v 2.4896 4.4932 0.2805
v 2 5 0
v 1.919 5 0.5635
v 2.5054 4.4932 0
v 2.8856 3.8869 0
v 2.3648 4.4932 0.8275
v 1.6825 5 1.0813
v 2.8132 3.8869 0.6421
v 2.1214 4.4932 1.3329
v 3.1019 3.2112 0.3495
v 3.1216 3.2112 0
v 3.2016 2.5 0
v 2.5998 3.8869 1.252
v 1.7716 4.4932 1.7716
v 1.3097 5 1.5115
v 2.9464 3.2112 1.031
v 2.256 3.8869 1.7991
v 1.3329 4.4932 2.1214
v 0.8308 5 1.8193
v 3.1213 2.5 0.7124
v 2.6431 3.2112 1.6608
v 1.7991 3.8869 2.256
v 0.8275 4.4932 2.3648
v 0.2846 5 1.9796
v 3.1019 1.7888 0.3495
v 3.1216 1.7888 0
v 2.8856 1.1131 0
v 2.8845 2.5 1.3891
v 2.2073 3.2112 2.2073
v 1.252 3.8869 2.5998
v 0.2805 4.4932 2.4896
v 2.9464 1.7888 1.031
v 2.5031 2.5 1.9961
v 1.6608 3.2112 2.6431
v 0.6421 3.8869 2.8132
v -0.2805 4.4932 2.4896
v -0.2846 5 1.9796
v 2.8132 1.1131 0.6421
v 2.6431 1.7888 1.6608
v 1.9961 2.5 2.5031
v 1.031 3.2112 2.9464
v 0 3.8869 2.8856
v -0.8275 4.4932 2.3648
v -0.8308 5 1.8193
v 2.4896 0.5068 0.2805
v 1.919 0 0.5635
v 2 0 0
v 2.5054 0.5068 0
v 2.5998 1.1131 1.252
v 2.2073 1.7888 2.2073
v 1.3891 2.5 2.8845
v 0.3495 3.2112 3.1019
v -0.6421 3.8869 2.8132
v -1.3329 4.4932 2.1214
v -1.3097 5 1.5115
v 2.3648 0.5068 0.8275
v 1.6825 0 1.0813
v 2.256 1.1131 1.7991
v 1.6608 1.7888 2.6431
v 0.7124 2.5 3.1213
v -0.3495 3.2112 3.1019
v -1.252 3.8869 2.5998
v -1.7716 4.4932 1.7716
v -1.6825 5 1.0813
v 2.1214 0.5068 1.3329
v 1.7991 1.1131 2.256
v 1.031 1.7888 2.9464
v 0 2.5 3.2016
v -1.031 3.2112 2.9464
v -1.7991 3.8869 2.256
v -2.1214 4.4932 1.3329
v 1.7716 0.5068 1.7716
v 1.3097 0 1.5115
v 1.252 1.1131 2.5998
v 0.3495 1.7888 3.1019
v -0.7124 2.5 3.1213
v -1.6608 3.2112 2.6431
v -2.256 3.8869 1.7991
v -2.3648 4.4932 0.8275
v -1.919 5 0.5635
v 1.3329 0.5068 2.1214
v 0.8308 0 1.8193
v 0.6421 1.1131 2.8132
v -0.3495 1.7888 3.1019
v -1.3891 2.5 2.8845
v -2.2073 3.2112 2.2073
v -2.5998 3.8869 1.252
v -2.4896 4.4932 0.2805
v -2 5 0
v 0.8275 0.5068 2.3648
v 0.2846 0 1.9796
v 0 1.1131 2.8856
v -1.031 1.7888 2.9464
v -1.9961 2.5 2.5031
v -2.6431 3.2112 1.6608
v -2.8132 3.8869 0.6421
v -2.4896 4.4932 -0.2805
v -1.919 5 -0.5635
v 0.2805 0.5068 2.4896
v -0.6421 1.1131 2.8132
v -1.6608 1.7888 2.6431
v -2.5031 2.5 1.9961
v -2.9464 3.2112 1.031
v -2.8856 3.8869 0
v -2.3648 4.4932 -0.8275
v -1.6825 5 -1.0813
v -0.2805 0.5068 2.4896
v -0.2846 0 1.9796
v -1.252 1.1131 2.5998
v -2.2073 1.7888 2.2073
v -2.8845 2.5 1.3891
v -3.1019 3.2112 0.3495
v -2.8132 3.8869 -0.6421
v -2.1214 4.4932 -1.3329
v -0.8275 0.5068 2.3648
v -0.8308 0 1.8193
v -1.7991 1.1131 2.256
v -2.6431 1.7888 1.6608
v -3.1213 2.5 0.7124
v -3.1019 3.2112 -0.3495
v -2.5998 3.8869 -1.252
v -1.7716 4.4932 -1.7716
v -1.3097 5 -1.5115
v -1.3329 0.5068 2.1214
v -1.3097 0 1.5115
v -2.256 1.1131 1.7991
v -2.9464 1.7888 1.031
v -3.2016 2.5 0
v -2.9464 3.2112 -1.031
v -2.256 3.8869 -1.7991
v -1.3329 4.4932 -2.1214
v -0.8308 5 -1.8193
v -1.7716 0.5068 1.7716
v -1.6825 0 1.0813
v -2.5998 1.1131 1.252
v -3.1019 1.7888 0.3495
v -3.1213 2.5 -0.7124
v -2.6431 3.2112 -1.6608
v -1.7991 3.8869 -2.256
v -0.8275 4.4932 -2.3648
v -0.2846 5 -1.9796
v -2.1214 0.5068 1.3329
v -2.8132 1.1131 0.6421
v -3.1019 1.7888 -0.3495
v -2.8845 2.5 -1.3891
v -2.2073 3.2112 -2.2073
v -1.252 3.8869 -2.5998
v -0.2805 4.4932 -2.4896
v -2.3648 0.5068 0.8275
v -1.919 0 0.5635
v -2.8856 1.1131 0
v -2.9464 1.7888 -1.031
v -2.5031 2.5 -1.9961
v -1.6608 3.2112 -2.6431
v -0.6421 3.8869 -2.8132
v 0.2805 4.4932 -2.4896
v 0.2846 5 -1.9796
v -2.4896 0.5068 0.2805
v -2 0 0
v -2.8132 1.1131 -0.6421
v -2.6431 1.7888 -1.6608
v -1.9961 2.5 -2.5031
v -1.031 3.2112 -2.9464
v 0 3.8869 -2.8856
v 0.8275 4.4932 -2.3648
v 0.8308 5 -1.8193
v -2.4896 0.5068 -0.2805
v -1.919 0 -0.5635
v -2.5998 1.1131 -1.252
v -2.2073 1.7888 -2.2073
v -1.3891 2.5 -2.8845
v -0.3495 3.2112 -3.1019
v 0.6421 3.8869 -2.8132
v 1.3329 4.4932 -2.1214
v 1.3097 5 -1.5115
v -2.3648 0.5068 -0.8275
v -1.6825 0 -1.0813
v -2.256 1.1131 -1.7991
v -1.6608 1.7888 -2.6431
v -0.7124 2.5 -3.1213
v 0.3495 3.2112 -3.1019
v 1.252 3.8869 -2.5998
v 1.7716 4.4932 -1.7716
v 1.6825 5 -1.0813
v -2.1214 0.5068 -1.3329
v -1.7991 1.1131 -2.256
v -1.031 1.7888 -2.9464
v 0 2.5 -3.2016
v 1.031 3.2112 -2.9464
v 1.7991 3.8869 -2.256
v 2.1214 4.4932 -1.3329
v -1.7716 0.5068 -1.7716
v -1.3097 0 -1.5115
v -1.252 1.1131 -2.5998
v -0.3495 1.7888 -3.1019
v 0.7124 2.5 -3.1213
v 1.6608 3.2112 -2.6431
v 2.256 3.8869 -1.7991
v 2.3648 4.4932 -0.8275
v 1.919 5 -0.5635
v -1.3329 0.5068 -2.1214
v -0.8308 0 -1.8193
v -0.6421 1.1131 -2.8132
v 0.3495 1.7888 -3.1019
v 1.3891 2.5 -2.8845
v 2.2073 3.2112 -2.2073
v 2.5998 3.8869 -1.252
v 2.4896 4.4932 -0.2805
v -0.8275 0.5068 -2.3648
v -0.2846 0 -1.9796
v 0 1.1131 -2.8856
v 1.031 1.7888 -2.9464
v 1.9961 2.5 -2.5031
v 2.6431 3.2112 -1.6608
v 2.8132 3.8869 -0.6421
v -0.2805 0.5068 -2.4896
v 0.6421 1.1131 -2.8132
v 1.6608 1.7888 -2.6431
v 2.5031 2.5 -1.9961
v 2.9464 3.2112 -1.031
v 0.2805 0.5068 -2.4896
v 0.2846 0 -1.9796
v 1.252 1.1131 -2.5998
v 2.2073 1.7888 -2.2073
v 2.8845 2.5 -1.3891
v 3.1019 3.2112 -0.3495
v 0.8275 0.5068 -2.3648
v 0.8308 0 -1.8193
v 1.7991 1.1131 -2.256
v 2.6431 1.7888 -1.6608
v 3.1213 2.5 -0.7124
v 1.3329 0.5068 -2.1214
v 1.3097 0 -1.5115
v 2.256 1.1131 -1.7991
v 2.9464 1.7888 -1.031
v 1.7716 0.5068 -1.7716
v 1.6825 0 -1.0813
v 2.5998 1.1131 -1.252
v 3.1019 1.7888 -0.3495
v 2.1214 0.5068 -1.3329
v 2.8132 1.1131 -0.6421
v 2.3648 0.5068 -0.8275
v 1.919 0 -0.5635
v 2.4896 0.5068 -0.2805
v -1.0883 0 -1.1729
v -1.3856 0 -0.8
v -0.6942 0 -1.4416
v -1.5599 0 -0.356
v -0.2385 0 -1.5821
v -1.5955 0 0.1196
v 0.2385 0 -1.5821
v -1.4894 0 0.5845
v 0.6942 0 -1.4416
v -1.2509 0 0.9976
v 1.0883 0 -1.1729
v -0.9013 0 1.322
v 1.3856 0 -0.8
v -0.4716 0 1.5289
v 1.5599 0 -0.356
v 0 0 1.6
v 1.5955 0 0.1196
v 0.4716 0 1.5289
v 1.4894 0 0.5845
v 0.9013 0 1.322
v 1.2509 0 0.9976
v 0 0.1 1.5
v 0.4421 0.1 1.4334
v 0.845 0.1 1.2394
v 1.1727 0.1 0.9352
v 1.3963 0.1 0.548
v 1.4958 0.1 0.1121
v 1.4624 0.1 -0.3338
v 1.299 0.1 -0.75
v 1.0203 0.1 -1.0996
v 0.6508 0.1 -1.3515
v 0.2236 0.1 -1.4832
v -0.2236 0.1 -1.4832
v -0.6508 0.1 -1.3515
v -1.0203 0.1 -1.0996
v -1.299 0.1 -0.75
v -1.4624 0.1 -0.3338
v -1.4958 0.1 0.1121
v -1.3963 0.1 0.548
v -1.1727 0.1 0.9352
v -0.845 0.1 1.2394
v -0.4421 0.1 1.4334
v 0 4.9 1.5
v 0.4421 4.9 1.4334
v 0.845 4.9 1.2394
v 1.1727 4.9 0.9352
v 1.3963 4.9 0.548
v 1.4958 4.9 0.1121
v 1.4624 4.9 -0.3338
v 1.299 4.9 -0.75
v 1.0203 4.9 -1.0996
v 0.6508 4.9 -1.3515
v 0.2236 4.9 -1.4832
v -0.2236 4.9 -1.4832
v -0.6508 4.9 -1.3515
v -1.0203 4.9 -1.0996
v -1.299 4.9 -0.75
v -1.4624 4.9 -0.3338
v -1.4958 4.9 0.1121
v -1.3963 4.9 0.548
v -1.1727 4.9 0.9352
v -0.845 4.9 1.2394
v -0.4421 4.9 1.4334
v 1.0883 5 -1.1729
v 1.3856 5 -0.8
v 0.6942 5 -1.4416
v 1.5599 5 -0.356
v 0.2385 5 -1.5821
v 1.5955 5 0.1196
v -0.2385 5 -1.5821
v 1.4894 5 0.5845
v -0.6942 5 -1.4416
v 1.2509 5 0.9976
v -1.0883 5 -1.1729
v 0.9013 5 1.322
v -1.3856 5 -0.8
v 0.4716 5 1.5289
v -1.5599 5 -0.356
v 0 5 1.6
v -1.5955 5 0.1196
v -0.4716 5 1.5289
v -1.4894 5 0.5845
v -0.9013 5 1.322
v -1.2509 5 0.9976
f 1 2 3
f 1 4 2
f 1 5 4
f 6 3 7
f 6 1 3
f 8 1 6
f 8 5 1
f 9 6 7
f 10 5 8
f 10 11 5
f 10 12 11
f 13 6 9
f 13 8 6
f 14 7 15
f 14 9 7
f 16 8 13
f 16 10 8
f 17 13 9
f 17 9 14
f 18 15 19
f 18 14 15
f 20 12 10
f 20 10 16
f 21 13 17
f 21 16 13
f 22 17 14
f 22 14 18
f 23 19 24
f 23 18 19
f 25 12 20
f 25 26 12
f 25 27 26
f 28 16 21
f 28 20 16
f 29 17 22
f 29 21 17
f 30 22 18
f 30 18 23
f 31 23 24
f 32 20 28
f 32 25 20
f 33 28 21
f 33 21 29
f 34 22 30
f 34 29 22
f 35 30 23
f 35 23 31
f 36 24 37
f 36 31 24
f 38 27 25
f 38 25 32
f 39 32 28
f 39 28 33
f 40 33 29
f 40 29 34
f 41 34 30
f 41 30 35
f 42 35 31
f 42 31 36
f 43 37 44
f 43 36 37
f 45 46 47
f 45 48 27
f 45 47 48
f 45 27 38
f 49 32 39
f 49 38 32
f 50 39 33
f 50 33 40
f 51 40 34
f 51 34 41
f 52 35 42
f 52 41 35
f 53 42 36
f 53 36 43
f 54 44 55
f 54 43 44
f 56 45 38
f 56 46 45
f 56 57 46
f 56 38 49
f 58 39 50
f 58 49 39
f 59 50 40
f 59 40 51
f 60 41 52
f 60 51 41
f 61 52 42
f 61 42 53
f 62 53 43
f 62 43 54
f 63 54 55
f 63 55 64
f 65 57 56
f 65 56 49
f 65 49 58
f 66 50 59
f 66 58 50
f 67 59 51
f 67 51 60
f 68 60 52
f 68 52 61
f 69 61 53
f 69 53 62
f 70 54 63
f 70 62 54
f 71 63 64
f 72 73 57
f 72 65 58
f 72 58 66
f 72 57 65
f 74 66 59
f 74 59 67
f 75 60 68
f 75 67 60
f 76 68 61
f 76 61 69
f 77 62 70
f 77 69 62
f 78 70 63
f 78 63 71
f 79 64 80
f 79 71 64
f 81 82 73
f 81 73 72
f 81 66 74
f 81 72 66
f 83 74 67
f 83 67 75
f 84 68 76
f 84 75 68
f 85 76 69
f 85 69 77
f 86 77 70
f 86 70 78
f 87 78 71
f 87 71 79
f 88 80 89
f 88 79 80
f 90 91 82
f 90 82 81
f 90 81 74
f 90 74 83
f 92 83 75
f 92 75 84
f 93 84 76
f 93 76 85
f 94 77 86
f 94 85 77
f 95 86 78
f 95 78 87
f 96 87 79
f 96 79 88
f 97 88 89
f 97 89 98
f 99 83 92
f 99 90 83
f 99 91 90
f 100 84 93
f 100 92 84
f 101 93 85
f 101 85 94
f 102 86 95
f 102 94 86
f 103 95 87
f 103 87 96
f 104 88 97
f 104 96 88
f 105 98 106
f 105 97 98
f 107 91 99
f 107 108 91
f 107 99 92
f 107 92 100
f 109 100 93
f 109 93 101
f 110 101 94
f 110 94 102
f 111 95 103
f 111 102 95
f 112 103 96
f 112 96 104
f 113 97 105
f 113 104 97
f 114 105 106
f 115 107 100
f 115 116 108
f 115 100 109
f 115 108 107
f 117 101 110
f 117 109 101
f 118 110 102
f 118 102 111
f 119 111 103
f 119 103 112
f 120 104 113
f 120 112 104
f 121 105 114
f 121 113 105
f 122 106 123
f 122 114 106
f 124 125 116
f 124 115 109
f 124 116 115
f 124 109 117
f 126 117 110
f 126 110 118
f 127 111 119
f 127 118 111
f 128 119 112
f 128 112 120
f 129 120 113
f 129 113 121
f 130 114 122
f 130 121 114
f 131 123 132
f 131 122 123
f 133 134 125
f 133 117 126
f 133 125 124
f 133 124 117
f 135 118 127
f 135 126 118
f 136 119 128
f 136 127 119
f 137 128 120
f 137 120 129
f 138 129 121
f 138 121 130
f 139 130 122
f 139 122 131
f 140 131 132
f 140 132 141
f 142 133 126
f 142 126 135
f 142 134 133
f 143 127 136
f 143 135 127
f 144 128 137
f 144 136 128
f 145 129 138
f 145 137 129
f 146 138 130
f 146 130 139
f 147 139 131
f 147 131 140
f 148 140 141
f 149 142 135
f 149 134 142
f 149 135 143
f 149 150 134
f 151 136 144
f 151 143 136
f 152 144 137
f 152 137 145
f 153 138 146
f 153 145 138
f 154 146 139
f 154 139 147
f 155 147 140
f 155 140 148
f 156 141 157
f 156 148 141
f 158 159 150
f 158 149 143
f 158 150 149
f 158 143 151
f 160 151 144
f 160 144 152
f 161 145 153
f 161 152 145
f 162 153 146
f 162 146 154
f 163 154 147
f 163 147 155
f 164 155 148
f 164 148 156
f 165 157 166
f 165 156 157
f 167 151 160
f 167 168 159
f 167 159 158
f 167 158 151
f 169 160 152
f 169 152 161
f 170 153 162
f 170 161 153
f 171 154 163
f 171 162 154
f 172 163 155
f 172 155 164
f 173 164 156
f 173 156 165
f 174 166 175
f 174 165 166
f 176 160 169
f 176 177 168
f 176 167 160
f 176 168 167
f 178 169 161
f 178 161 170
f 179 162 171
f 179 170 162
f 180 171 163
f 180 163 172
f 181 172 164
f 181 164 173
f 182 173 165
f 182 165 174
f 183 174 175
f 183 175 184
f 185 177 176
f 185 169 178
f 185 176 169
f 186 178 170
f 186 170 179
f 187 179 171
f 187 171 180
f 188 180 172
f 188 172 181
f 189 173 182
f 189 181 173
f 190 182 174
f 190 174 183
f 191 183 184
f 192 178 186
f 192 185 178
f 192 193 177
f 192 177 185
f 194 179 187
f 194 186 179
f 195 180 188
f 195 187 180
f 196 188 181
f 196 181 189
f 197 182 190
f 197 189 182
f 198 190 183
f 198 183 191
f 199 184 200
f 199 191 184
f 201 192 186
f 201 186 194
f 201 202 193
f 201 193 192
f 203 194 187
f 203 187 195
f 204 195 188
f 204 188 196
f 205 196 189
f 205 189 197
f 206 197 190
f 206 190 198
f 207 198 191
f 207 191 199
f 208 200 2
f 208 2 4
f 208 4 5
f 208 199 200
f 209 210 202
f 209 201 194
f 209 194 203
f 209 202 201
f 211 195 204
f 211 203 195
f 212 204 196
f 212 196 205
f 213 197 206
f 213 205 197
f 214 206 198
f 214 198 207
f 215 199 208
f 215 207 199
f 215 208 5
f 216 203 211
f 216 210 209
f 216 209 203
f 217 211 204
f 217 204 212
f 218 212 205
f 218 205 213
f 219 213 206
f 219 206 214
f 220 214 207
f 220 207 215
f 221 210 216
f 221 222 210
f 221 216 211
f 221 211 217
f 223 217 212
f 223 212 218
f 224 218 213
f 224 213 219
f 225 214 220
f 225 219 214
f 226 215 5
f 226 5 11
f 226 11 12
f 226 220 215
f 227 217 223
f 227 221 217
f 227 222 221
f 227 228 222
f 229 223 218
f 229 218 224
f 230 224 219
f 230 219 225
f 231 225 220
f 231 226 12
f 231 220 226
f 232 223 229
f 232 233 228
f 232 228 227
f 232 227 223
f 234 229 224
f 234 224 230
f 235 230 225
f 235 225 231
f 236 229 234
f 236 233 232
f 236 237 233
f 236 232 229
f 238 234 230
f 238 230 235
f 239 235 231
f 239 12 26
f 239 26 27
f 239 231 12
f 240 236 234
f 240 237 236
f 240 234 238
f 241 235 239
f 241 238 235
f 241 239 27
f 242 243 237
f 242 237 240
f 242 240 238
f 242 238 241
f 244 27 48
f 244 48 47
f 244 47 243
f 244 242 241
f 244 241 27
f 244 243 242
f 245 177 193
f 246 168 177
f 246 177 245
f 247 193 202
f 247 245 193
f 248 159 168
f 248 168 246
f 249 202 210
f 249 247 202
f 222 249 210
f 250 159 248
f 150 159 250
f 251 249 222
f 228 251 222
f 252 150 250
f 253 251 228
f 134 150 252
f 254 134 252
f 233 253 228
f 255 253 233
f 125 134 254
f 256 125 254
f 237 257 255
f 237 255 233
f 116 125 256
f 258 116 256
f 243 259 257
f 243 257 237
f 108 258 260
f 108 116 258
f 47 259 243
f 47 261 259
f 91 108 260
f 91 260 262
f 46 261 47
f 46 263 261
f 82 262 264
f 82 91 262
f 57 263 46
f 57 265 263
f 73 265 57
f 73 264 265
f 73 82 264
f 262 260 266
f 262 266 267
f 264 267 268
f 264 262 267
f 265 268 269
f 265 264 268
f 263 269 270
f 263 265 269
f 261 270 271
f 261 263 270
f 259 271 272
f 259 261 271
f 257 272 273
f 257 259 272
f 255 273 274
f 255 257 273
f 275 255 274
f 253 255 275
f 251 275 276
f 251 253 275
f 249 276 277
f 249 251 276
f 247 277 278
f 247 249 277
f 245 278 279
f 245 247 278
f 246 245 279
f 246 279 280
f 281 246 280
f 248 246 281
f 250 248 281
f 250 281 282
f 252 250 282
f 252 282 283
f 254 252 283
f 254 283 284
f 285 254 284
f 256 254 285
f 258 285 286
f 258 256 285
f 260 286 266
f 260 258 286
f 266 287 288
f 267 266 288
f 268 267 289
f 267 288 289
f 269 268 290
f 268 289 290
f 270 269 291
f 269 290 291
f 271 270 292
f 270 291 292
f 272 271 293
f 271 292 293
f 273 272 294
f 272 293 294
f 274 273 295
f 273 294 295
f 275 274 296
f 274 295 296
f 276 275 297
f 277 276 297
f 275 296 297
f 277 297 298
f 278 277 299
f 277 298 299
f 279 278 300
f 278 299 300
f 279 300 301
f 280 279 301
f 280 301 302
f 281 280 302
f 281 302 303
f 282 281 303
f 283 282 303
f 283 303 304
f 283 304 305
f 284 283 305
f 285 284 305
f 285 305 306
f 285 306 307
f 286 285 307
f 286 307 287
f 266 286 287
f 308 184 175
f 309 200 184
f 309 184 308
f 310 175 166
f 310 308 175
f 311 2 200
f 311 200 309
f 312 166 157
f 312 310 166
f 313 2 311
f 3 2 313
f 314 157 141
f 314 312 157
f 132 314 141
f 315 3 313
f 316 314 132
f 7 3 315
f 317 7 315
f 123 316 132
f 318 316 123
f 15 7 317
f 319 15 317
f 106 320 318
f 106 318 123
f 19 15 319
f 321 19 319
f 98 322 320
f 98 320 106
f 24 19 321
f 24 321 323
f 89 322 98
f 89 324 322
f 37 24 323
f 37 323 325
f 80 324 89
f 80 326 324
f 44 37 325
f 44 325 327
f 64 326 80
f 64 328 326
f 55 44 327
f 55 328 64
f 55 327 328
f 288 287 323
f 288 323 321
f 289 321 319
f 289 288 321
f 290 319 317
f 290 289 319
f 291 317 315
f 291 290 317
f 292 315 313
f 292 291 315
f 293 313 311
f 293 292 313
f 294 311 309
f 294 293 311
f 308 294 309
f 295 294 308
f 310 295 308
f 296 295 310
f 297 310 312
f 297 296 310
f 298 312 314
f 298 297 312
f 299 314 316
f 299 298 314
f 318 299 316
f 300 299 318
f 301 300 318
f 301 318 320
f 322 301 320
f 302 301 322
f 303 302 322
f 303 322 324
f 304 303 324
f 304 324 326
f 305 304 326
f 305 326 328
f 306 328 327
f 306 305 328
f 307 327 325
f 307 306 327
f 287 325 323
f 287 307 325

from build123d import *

# Parameters (mm, degrees)
SKETCH2_R          = 1.5
CUT_EXTRUDE1_DEPTH = 7.745368782
CHAMFER1_SIZE      = 0.1


with BuildPart() as part:
    # Sketch1 → Revolve2 (revolve)
    with BuildSketch(Plane.XY):
        with BuildLine():
            Line((0, 5), (2, 5))
            ThreePointArc((2, 5), (3.201562119, 2.5), (2, 0))
            Line((2, 0), (0, 0))
            Line((0, 0), (0, 5))
        make_face()
    revolve(axis=Axis((0, 0, 0), (0, -1, 0)))

    # Sketch2 → Cut-Extrude1 (cut, through all)
    with BuildSketch(Plane(origin=(0, 5, 0), x_dir=(1, 0, 0), z_dir=(0, 1, 0))):
        with Locations(Location((0, 0, 0), (0, 0, 270))):
            Circle(SKETCH2_R)
    extrude(amount=-CUT_EXTRUDE1_DEPTH, mode=Mode.SUBTRACT)

    # Chamfer1
    chamfer1_edges = [part.edges().sort_by_distance(p)[0] for p in [
        (0, 0, -1.5),
        (0, 5, -1.5),
    ]]
    chamfer(chamfer1_edges, length=CHAMFER1_SIZE)


solid = part.part
